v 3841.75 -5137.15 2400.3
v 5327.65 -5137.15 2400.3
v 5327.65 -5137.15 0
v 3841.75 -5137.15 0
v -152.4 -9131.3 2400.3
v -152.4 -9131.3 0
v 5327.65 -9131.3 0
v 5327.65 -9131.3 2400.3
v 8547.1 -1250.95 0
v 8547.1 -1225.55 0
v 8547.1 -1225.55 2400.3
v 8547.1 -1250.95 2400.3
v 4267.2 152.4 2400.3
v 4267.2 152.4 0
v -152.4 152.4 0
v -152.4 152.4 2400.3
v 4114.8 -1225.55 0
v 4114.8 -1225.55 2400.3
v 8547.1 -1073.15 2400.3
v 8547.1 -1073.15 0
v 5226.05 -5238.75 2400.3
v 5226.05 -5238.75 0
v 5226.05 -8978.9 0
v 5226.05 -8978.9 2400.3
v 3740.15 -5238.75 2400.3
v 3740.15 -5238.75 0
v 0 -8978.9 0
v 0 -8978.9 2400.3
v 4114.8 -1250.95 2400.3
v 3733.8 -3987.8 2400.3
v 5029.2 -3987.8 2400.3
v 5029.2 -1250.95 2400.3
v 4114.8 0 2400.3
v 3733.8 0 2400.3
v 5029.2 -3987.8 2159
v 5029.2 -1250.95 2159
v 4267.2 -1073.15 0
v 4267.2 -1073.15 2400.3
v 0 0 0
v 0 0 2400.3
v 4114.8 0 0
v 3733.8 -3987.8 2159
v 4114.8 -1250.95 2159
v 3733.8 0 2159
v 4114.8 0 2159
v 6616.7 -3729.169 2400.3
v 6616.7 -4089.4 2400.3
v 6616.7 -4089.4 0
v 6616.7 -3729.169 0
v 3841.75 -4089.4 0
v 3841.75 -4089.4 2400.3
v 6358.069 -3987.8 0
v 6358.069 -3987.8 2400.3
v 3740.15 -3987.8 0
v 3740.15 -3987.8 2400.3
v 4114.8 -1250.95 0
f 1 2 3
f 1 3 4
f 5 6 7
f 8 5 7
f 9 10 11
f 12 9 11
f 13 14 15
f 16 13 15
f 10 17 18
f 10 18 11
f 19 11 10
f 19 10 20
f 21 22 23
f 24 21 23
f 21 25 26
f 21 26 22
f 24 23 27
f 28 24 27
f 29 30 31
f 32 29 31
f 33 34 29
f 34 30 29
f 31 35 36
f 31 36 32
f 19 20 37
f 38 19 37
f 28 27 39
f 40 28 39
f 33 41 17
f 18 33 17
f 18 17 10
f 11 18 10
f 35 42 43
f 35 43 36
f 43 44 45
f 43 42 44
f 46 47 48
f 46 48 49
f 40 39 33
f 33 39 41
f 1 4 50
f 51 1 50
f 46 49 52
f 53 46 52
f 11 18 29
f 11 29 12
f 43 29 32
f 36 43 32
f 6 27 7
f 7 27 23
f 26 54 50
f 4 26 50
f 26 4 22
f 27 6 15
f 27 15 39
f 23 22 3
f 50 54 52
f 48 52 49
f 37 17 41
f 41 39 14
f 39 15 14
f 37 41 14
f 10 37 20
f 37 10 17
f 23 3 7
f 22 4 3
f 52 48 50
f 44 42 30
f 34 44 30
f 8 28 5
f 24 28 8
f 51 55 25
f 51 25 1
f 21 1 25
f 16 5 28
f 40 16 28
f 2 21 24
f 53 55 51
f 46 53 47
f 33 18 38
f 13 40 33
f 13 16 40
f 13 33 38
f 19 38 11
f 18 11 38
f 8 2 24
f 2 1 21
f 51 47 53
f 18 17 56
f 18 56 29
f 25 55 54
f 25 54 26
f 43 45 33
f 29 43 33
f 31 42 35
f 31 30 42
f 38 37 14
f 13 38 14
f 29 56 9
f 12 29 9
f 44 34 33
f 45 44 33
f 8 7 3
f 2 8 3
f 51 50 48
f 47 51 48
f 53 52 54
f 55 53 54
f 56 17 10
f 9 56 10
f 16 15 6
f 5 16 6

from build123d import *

# Parameters (mm, degrees)
F1_DEPTH = 2400.3
F3_W     = 381
F3_H     = 241.3
F4_DEPTH = 3987.8
F5_DEPTH = 25.4
F6_W     = 914.4
F6_H     = 241.3
F7_DEPTH = 2736.85


with BuildPart() as f1:
    # F0 (on Top) → F1 (new body)
    with BuildSketch(Plane.XY):
        Polygon((0, -8978.9), (0, 0), (4114.8, 0), (4114.8, -1225.55), (8547.1, -1225.55), (8547.1, -1073.15), (4267.2, -1073.15), (4267.2, 152.4), (-152.4, 152.4), (-152.4, -9131.3), (5327.65, -9131.3), (5327.65, -5137.15), (3841.75, -5137.15), (3841.75, -4089.4), (6616.7, -4089.4), (6616.7, -3729.1686237132), (6358.0686237132, -3987.8), (3740.15, -3987.8), (3740.15, -5238.75), (5226.05, -5238.75), (5226.05, -8978.9), align=None)
    extrude(amount=F1_DEPTH)


with BuildPart() as f4:
    # F3 (on face) → F4 (new body, through all)
    with BuildSketch(Plane.XZ):
        with Locations((3924.3, 2279.65)):
            Rectangle(F3_W, F3_H)
    extrude(amount=F4_DEPTH)

    # F6 (on face) → F7 (join, through all)
    with BuildSketch(Plane.XZ.offset(1250.95)):
        with Locations((4572, 2279.65)):
            Rectangle(F6_W, F6_H)
    extrude(amount=F7_DEPTH)


with BuildPart() as f5:
    # F5 (new): a face of the model
    f5_faces = [f1.part.faces().sort_by_distance(p)[0] for p in [
        (6330.95, -1225.55, 1200.15),
    ]]
    extrude(f5_faces, amount=F5_DEPTH)


solid = Compound([f1.part, f4.part, f5.part])
